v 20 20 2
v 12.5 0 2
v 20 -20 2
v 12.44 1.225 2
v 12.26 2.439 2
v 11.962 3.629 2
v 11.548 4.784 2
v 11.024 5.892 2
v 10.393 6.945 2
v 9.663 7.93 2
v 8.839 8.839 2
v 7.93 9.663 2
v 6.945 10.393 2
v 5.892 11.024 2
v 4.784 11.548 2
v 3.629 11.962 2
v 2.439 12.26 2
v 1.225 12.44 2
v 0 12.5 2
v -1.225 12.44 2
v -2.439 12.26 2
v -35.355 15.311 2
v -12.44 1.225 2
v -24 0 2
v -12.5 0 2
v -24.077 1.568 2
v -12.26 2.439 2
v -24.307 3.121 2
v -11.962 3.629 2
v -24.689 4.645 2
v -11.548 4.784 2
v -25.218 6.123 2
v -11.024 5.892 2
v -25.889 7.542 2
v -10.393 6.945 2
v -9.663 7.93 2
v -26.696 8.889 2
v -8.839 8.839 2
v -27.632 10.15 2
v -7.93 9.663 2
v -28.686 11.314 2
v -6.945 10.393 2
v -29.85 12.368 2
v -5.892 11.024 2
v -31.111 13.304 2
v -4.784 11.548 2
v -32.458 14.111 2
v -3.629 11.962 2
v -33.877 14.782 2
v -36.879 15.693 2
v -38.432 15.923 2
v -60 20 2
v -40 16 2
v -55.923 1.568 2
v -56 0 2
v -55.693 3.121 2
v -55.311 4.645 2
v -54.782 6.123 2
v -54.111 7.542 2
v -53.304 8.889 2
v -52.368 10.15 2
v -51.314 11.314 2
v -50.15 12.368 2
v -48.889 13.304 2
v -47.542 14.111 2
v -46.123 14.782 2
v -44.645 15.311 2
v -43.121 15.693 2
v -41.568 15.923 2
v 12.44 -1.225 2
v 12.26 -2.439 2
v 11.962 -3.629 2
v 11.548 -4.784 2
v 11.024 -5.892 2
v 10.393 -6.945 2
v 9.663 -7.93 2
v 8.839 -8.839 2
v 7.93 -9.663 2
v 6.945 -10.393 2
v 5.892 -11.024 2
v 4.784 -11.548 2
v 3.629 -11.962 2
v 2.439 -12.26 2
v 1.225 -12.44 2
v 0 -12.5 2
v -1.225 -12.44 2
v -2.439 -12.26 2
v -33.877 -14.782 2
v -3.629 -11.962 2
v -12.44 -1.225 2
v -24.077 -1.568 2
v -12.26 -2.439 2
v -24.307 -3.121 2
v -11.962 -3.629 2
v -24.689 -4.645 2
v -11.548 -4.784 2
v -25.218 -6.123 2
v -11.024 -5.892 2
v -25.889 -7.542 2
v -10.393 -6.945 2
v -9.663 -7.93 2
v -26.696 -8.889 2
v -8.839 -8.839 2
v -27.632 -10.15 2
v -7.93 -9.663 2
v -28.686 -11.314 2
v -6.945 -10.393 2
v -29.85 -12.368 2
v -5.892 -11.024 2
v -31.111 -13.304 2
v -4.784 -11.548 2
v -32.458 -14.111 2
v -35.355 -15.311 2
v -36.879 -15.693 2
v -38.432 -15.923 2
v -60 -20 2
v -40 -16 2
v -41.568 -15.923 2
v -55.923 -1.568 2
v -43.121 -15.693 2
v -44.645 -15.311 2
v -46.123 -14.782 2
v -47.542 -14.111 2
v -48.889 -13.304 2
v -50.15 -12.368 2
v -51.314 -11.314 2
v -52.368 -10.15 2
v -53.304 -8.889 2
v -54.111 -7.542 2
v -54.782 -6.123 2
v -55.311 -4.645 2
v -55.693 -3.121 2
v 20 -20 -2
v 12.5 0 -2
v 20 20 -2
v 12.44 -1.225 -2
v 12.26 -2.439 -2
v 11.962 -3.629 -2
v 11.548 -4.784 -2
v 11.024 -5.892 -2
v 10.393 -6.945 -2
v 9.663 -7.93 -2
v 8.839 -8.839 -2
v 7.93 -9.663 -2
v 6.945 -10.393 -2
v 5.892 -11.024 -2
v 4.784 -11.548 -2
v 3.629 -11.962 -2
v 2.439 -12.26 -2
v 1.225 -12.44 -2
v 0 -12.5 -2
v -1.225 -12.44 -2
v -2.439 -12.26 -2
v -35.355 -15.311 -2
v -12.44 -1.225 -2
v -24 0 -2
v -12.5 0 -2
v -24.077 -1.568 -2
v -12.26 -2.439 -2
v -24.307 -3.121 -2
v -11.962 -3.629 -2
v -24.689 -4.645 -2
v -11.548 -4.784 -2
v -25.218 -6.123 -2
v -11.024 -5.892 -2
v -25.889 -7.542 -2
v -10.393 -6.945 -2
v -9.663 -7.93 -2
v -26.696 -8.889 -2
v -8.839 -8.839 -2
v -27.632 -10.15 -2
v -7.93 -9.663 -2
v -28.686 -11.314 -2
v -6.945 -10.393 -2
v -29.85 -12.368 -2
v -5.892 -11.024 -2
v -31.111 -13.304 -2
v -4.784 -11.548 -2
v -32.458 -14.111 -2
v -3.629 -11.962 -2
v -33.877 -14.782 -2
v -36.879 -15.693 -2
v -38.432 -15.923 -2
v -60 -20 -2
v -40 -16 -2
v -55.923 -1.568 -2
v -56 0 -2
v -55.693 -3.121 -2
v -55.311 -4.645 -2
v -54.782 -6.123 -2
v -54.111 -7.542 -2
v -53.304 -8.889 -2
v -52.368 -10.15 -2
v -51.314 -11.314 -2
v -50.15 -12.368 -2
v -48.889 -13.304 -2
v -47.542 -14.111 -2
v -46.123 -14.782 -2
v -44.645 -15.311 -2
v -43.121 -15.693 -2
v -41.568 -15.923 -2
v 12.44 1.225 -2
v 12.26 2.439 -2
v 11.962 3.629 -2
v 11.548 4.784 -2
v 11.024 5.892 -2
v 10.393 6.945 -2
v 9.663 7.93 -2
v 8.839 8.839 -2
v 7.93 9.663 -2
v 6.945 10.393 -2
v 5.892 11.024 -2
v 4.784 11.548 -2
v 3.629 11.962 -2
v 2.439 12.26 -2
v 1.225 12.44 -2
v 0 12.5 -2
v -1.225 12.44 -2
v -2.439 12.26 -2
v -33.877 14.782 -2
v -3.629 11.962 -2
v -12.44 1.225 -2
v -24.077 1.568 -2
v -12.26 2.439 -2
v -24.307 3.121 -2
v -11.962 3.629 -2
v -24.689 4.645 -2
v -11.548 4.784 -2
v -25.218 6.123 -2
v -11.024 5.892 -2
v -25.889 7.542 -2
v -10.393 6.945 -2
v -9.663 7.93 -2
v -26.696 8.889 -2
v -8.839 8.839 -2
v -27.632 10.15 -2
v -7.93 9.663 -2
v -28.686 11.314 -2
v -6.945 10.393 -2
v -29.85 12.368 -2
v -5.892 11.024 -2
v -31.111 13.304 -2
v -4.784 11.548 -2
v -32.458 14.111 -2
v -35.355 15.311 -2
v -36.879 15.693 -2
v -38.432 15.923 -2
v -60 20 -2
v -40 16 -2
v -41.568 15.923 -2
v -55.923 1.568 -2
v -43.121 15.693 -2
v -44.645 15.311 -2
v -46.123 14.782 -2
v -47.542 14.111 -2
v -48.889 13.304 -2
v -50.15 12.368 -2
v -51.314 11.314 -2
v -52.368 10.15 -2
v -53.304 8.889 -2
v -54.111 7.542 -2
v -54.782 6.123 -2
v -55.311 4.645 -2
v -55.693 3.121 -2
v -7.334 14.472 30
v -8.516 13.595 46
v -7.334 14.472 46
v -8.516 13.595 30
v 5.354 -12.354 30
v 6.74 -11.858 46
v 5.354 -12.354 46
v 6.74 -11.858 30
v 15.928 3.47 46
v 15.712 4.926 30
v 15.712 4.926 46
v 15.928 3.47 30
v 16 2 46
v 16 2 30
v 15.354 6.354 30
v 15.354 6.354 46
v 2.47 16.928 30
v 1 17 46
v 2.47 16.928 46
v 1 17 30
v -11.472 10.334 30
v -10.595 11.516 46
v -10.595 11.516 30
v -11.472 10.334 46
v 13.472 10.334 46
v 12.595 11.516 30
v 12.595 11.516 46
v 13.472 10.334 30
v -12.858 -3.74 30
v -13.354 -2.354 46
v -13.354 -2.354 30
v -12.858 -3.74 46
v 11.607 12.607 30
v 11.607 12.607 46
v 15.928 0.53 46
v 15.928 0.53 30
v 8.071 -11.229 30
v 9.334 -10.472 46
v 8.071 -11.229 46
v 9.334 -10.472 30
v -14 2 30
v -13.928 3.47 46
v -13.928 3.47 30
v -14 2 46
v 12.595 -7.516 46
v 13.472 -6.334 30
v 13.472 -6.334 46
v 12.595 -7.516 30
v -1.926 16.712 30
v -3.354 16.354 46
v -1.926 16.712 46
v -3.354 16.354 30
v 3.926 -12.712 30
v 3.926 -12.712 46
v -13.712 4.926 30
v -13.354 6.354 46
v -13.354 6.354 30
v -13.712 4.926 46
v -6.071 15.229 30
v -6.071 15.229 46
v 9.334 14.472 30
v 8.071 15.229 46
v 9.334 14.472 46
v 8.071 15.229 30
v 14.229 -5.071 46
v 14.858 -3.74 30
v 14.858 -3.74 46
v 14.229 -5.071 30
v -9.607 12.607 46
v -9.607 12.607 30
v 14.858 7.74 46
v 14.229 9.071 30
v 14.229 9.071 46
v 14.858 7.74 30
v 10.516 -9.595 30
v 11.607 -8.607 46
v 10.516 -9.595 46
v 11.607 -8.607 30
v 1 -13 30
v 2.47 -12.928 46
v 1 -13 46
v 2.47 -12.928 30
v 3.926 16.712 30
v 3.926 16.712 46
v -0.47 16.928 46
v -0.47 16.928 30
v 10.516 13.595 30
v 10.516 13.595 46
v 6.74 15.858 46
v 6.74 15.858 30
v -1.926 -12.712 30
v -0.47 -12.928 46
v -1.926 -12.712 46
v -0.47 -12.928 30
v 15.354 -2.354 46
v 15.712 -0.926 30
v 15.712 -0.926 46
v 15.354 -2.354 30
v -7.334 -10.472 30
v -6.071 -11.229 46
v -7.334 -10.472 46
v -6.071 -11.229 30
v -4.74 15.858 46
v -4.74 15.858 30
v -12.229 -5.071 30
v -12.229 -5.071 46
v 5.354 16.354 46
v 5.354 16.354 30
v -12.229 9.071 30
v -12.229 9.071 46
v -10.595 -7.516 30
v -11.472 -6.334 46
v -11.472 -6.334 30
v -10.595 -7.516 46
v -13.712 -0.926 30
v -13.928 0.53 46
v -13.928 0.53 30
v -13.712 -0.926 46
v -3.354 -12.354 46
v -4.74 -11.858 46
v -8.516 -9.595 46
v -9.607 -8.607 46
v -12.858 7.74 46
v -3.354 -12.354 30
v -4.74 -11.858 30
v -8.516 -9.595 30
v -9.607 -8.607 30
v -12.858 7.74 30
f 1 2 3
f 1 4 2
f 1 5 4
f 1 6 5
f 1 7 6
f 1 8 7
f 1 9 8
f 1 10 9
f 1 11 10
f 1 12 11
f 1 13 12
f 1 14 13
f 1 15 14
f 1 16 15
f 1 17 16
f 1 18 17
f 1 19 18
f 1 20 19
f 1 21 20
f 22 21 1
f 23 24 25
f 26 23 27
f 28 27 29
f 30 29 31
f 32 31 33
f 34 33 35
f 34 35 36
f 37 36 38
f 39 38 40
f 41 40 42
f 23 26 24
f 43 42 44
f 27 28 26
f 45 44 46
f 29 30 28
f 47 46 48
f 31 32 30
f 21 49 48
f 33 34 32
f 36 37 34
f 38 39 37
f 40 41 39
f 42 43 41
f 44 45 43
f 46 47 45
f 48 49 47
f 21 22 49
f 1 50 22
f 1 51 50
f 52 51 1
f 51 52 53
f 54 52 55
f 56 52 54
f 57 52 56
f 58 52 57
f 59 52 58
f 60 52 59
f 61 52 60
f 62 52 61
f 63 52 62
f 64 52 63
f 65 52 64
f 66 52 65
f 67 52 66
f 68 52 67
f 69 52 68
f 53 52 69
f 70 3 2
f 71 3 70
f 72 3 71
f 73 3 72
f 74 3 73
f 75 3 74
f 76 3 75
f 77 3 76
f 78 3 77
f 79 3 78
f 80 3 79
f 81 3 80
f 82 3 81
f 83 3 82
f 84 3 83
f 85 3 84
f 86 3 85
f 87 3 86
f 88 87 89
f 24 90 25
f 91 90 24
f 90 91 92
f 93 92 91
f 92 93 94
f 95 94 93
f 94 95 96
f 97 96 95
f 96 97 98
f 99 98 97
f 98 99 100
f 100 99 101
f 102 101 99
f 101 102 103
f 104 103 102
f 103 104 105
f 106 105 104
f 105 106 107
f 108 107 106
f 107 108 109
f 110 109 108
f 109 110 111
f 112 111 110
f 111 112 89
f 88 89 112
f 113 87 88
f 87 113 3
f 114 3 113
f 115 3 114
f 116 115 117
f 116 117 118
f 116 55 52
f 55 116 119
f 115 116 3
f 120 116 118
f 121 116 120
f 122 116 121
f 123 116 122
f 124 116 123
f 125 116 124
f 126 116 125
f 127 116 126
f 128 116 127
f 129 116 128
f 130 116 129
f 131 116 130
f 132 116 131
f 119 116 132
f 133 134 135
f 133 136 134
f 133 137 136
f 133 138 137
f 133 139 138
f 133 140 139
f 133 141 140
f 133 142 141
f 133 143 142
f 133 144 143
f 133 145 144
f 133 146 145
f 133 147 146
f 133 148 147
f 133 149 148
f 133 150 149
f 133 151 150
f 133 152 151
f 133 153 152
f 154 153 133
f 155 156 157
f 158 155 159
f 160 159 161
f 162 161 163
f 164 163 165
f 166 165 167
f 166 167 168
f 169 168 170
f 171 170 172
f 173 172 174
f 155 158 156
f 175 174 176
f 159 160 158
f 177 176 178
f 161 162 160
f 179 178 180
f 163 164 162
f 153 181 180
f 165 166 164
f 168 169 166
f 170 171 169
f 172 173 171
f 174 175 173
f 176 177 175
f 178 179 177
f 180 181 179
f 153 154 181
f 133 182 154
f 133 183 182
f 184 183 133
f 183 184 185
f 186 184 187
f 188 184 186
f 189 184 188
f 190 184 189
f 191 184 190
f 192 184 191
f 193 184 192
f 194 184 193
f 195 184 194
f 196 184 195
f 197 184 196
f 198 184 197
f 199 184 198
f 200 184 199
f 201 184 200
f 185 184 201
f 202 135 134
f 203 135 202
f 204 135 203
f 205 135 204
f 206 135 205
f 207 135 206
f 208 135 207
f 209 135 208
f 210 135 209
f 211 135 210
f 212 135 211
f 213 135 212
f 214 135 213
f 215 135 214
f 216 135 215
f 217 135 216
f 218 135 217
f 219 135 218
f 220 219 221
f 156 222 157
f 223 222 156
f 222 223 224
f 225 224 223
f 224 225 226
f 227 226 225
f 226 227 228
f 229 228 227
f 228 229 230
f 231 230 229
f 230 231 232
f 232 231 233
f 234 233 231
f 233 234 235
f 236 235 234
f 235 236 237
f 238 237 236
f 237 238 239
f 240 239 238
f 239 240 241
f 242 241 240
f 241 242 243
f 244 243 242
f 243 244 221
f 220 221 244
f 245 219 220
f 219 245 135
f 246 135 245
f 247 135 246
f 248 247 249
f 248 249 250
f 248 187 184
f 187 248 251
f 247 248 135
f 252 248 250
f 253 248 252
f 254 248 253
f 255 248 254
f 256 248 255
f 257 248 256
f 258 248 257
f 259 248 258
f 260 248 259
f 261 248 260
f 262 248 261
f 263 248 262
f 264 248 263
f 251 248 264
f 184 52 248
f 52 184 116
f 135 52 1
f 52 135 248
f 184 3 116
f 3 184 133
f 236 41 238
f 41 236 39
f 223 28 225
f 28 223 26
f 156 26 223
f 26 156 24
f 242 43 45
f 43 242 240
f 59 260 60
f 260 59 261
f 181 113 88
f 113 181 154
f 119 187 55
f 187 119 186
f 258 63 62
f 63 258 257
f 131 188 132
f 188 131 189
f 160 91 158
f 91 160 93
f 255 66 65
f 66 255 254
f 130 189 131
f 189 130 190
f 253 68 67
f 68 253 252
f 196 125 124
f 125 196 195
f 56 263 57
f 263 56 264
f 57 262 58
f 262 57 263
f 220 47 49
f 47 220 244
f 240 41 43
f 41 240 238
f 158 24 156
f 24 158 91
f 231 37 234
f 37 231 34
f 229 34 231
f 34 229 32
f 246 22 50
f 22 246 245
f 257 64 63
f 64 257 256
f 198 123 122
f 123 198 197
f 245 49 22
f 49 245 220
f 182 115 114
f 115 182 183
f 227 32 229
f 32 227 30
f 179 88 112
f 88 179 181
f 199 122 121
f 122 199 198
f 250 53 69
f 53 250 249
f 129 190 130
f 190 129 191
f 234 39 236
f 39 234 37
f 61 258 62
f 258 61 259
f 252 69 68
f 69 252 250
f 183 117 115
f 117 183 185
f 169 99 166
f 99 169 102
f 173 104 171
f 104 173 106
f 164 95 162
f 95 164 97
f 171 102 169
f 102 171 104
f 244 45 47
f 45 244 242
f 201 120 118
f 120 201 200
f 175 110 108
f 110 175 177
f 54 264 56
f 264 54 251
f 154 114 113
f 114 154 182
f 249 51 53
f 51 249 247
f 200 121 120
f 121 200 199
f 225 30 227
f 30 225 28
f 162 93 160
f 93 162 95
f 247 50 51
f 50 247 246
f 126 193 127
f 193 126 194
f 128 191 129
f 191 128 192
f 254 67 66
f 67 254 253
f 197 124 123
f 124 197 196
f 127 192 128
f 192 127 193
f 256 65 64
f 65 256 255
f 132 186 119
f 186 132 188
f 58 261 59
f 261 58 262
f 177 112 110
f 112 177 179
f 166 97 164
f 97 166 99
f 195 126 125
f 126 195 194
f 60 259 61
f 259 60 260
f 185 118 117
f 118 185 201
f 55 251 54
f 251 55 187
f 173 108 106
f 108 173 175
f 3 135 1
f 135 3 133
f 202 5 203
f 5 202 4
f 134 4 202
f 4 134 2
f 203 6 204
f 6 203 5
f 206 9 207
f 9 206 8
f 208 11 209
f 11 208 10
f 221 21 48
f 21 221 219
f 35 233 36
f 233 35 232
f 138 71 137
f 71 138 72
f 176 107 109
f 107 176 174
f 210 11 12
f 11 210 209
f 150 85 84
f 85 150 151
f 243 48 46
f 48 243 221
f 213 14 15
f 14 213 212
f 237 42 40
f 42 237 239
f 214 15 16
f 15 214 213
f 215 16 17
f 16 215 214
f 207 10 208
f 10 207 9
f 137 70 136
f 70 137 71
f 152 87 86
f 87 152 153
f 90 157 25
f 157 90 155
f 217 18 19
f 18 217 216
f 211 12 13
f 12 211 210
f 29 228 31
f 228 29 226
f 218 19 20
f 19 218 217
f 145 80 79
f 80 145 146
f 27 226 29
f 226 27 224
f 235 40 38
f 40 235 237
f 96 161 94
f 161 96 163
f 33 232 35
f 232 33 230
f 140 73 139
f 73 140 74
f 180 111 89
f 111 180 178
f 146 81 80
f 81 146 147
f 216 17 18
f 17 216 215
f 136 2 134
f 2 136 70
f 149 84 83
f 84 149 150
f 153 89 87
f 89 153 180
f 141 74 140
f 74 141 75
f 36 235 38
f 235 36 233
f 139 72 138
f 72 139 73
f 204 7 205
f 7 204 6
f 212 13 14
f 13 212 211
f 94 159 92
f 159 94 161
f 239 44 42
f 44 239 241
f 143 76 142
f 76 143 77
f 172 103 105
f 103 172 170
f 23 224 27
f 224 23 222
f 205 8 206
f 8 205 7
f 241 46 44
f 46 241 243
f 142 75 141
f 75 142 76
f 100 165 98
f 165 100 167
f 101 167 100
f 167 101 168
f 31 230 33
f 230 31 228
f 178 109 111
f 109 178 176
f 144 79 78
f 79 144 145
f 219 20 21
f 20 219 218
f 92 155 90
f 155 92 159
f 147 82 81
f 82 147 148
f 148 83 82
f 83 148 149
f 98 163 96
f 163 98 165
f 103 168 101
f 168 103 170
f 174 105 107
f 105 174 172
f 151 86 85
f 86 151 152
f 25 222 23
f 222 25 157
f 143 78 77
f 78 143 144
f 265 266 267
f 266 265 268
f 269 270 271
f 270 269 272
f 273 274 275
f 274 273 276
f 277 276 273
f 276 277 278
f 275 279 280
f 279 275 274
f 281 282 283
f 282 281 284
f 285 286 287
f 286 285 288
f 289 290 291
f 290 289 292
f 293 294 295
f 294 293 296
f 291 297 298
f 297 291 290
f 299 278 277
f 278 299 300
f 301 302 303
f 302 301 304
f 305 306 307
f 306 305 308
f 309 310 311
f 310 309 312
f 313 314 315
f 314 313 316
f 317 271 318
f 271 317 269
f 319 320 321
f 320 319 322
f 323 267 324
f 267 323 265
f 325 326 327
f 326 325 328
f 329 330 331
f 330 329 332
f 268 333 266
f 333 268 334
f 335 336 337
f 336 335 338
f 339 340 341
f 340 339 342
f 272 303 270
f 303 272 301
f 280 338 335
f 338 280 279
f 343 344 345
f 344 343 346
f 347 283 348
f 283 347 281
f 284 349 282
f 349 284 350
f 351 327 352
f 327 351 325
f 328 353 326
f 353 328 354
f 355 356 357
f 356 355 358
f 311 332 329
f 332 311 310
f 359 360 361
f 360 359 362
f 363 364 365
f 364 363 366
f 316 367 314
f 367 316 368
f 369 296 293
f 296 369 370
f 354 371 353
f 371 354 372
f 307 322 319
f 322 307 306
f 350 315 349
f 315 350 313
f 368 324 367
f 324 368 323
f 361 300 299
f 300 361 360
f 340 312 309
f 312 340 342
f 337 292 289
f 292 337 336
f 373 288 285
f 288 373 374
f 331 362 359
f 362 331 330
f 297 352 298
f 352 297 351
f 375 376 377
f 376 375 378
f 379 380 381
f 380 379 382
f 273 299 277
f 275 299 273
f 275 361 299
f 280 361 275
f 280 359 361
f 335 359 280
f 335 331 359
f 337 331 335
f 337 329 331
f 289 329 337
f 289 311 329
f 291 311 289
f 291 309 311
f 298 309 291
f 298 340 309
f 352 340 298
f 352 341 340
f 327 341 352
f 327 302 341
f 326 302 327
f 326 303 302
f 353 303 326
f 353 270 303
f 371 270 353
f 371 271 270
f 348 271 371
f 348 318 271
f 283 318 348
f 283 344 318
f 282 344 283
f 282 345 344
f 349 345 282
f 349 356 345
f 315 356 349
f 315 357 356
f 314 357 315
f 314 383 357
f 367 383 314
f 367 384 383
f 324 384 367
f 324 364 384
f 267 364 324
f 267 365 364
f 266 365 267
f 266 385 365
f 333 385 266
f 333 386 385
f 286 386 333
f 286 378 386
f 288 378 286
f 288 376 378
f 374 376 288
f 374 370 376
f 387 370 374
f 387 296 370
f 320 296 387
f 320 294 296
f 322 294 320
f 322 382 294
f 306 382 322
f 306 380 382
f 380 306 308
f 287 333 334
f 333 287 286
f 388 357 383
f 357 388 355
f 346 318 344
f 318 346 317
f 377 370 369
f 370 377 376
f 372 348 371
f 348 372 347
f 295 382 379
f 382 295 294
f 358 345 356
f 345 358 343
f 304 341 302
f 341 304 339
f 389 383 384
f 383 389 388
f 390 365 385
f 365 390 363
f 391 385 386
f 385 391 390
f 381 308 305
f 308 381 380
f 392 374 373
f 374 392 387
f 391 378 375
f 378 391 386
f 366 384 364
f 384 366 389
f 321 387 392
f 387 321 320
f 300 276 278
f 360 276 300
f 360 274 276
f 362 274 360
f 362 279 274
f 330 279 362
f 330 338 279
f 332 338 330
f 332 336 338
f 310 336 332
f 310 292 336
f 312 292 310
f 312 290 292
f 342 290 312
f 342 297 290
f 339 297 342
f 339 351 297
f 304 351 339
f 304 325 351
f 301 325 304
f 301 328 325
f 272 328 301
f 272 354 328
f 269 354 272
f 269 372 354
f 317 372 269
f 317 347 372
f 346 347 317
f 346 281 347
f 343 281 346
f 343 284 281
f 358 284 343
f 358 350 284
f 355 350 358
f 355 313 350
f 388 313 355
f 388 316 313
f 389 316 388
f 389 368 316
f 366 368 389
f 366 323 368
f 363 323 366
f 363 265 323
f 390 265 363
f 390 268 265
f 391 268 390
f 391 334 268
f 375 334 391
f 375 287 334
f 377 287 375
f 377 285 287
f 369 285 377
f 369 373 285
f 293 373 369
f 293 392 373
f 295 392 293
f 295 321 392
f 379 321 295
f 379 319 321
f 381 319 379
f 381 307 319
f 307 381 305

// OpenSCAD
$fn = 64; // Set the arc

cube_w = 40;
cube_h = 4;

small_btn_diameter = 25; // mm
large_btn_diameter = 32; // mm

small_btn_radius = sqrt(small_btn_diameter);
large_btn_radius = sqrt(large_btn_diameter);


module btn(x,y,z, dia) {
    translate([x,y,z])
    cylinder(h = 16, d = dia);
}

translate([-cube_w, 0, 0]){
difference() {
cube(size = [cube_w, cube_w, cube_h], center = true);
cylinder(h = 16, d = large_btn_diameter, center = true);
}
}

difference() {
cube(size = [cube_w, cube_w, cube_h], center = true);
    
cylinder(h = 16, d = small_btn_diameter, center = true);
}



btn(1,2,30, 30);
